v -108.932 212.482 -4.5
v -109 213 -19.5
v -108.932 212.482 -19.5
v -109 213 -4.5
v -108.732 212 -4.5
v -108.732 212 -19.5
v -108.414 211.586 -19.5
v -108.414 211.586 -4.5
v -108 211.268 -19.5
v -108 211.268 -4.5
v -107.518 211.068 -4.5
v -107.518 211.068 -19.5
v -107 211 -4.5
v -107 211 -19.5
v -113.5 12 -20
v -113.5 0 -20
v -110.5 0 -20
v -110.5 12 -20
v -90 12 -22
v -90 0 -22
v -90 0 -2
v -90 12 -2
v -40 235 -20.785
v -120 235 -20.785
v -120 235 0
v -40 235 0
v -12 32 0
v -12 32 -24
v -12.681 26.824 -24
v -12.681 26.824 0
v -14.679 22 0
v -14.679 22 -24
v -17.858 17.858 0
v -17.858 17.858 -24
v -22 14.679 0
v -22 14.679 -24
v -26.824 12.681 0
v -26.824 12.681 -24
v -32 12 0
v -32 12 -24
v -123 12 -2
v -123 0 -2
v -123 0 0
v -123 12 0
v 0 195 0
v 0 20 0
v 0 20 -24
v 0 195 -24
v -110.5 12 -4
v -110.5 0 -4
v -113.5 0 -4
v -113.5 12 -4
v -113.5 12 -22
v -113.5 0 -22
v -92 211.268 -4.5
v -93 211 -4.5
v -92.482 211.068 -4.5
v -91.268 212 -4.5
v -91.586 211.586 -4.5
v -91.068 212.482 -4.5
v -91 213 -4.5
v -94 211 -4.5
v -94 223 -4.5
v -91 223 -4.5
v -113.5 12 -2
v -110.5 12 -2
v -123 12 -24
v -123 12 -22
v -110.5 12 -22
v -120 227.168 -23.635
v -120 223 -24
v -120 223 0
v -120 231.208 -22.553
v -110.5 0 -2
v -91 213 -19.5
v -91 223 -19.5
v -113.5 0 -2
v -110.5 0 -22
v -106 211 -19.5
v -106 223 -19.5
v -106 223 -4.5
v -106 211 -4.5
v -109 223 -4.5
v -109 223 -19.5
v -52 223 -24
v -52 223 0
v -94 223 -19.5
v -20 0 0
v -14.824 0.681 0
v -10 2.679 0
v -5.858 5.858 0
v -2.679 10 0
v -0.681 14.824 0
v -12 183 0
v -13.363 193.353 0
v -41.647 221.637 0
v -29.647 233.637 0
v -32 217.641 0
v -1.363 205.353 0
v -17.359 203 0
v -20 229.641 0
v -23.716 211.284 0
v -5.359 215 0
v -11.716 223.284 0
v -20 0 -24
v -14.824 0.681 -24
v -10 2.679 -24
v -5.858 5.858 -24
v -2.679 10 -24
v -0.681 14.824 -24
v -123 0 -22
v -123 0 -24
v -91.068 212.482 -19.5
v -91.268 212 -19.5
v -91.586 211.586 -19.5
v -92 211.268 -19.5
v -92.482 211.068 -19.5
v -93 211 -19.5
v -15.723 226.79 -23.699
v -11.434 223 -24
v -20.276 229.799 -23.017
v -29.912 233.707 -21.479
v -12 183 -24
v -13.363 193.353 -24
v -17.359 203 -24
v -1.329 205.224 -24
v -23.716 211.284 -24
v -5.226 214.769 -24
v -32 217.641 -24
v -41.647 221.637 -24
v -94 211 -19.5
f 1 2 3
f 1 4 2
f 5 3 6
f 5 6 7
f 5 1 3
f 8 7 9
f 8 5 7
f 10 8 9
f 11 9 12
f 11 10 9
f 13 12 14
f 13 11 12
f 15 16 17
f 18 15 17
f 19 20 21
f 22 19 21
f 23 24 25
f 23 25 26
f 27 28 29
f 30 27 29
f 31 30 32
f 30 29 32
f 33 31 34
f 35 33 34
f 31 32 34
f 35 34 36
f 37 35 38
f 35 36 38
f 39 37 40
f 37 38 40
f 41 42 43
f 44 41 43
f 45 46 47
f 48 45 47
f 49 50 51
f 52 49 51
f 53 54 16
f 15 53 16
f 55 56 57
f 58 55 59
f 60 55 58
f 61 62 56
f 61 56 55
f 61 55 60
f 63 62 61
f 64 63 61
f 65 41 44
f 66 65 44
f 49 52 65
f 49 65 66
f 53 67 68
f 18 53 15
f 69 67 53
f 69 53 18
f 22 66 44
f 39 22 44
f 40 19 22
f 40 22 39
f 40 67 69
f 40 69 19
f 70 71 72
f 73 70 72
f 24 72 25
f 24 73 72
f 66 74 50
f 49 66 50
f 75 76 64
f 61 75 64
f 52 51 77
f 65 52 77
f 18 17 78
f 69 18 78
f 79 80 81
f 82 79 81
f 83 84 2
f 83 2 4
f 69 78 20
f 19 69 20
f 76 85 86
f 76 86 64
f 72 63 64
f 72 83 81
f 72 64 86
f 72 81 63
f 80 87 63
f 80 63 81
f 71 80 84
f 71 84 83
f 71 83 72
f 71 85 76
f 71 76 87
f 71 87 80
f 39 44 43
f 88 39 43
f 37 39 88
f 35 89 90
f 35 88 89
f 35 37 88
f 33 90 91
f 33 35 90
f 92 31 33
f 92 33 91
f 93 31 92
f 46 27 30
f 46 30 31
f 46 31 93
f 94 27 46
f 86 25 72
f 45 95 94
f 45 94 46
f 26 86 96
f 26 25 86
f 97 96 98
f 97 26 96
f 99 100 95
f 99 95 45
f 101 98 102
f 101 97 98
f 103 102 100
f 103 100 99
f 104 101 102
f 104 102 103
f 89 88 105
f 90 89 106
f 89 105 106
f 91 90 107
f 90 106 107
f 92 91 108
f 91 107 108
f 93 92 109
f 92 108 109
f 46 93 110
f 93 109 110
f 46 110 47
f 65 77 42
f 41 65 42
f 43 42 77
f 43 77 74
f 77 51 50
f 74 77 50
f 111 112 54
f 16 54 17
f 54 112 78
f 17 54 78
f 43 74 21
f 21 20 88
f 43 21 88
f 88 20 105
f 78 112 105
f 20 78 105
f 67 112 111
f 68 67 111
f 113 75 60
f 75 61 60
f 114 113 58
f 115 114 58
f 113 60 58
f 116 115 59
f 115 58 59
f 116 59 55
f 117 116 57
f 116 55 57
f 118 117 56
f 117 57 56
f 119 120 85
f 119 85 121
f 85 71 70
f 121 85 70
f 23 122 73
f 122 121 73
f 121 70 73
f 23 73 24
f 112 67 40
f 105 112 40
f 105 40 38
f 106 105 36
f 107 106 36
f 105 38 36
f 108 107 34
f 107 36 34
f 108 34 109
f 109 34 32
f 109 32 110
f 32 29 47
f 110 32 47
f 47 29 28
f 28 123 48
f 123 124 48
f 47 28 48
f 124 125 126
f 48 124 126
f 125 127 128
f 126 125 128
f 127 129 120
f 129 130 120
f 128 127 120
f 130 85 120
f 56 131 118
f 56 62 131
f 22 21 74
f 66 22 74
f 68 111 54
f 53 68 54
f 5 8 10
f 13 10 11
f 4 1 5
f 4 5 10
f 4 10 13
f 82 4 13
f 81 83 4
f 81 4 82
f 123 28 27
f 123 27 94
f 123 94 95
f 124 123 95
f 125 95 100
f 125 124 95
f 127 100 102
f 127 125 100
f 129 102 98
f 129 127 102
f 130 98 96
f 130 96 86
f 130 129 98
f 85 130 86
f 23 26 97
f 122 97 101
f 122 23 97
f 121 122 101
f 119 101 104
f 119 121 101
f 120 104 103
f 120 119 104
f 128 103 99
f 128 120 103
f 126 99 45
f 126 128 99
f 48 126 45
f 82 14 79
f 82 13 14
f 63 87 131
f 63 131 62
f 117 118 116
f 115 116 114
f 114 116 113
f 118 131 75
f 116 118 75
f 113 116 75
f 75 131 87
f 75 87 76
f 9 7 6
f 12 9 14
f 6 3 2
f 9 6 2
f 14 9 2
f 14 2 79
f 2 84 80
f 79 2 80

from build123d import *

# Parameters (mm, degrees)
EXTRUDE_1_DEPTH     = 12
EXTRUDE_2_DEPTH     = 24
SKETCH_6_W          = 3
SKETCH_6_H          = 15
EXTRUDE_3_DEPTH     = 12
EXTRUDE_4_DEPTH     = 24
CUT_EXTRUDE_4_DEPTH = 267.326866838
CUT_EXTRUDE_5_DEPTH = 265.954713112
FILLET_1_R          = 2


with BuildPart() as part:
    # 草图1 → 凸台-拉伸1 (new body)
    with BuildSketch(Plane(origin=(0, 0, 0), x_dir=(1, 0, 0), z_dir=(0, 1, 0))):
        Polygon((-123, 2), (-123, 0), (0, 0), (0, 24), (-123, 24), (-123, 22), (-113.5, 22), (-113.5, 20), (-110.5, 20), (-110.5, 22), (-90, 22), (-90, 2), (-110.5, 2), (-110.5, 4), (-113.5, 4), (-113.5, 2), align=None)
    extrude(amount=EXTRUDE_1_DEPTH)

    # 草图5 → 凸台-拉伸2 (add)
    with BuildSketch(Plane(origin=(0, 0, -24), x_dir=(-1, 0, 0), z_dir=(0, 0, -1))):
        with BuildLine():
            Line((0, 0), (12, 0))
            Line((12, 0), (12, 183))
            ThreePointArc((12, 183), (23.715728753, 211.284271247), (52, 223))
            Line((52, 223), (120, 223))
            Line((120, 223), (120, 235))
            Line((120, 235), (40, 235))
            ThreePointArc((40, 235), (11.715728753, 223.284271247), (0, 195))
            Line((0, 195), (0, 0))
        make_face()
    extrude(amount=-EXTRUDE_2_DEPTH)

    # 草图6 → 凸台-拉伸3 (add)
    with BuildSketch(Plane.XZ.offset(-223)):
        with Locations((-107.5, -12)):
            Rectangle(SKETCH_6_W, SKETCH_6_H)
        with Locations((-92.5, -12)):
            Rectangle(SKETCH_6_W, SKETCH_6_H)
    extrude(amount=EXTRUDE_3_DEPTH)

    # 草图7 → 凸台-拉伸4 (add)
    with BuildSketch(Plane(origin=(0, 0, -24), x_dir=(-1, 0, 0), z_dir=(0, 0, -1))):
        with BuildLine():
            Line((32, 12), (12, 12))
            Line((12, 12), (12, 32))
            ThreePointArc((12, 32), (17.857864376, 17.857864376), (32, 12))
        make_face()
    extrude(amount=-EXTRUDE_4_DEPTH)

    # 草图8 → 切除-拉伸4 (cut, through all)
    with BuildSketch(Plane(origin=(0, 0, -24), x_dir=(-1, 0, 0), z_dir=(0, 0, -1))):
        with BuildLine():
            Line((0, 20), (0, 0))
            Line((0, 0), (20, 0))
            ThreePointArc((20, 0), (5.857864376, 5.857864376), (0, 20))
        make_face()
    extrude(amount=-CUT_EXTRUDE_4_DEPTH, mode=Mode.SUBTRACT)

    # 草图9 → 切除-拉伸5 (cut, through all)
    with BuildSketch(Plane.ZY.offset(120)):
        with BuildLine():
            Line((-24, 235), (-24, 223))
            ThreePointArc((-24, 223), (-23.182219831, 229.211657082), (-20.784609691, 235))
            Line((-20.784609691, 235), (-24, 235))
        make_face()
    extrude(amount=-CUT_EXTRUDE_5_DEPTH, mode=Mode.SUBTRACT)

    # 圆角1
    fillet_1_edges = [part.edges().sort_by_distance(p)[0] for p in [
        (-109, 211, -12),
        (-91, 211, -12),
    ]]
    fillet(fillet_1_edges, radius=FILLET_1_R)


solid = part.part
